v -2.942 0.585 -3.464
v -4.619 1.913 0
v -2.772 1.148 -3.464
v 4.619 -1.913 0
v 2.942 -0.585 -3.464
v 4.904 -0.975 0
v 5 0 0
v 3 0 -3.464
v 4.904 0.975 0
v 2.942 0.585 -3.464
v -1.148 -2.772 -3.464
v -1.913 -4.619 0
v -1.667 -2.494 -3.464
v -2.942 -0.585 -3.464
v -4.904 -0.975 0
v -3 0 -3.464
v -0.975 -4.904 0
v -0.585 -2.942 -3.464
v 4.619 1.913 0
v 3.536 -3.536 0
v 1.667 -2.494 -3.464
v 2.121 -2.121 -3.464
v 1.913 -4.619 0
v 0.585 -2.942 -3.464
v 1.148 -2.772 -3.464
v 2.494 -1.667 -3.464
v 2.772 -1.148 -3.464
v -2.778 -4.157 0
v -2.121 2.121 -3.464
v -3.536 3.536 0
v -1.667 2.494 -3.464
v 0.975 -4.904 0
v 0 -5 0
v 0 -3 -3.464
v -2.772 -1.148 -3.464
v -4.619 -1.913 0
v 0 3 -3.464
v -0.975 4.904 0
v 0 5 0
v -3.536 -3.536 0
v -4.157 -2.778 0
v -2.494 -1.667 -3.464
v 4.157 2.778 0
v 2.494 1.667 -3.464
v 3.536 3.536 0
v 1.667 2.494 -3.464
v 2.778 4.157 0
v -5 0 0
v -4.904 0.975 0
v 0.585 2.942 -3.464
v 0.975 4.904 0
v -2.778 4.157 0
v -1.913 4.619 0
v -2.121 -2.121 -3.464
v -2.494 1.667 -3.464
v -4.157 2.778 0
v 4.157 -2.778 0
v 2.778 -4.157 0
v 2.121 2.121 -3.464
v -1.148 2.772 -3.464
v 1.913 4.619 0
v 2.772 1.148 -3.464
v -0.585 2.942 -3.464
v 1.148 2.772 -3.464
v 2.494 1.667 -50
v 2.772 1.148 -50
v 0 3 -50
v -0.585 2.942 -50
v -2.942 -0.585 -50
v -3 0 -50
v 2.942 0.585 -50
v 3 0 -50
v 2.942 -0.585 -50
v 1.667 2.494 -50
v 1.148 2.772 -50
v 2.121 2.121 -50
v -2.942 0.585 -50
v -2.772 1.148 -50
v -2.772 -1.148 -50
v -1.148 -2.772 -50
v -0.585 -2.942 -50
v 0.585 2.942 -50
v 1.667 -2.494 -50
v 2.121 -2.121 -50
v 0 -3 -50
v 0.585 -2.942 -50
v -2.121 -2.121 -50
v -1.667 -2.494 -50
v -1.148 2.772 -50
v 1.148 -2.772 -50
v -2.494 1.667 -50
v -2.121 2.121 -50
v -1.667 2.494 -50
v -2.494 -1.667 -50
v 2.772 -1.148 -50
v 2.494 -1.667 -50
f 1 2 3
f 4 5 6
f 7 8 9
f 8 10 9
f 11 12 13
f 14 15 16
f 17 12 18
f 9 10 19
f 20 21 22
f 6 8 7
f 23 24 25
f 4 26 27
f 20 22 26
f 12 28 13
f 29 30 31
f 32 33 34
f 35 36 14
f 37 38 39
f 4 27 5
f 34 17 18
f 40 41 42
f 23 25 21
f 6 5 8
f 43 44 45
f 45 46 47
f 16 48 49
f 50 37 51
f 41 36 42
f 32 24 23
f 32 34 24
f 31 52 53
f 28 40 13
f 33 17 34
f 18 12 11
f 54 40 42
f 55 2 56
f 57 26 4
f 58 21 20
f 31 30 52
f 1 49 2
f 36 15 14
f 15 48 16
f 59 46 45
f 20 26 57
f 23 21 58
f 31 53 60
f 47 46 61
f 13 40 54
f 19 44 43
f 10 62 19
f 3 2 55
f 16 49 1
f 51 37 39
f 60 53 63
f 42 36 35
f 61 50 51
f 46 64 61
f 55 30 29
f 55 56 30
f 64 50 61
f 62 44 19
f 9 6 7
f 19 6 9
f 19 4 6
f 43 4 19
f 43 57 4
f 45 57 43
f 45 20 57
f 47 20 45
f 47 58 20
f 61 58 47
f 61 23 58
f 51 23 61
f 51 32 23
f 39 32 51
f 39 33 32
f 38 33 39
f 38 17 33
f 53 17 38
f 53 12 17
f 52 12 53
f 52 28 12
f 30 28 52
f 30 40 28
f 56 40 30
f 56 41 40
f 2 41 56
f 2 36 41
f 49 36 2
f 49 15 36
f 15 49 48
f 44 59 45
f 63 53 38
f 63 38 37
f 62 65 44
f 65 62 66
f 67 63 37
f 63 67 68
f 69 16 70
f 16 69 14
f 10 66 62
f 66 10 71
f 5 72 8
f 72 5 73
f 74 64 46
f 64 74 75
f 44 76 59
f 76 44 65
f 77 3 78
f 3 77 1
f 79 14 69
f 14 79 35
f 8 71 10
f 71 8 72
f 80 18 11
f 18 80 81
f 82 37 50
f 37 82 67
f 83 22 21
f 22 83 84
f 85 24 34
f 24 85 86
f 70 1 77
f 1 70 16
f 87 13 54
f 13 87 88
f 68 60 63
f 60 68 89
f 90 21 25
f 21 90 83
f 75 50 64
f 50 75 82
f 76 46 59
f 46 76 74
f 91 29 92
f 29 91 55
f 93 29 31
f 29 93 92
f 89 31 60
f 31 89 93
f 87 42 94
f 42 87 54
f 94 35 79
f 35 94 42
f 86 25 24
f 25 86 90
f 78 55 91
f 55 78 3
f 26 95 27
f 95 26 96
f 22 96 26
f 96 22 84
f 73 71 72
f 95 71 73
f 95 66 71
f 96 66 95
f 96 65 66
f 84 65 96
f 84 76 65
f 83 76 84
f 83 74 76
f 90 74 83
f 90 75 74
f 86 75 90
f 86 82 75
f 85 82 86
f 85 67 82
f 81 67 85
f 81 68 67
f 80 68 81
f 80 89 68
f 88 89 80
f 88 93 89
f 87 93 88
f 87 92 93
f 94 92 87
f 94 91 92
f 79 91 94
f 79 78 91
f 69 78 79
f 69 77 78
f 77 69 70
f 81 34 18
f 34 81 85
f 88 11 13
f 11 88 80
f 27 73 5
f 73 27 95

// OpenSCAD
// file: ../config.scad
// ============================================================
// PROJECT CONFIGURATION
// Description: Global settings for best_fence
// ============================================================

// ============================================================
// RENDERING SETTINGS
// ============================================================

// Preview quality (lower = faster preview)
PREVIEW_FN = 32;

// Export quality (higher = smoother STL)
EXPORT_FN = 128;

// Current mode (set to true when exporting STL)
// Override from command line: openscad -D 'EXPORT_MODE=true' ...
EXPORT_MODE = false;

// Convenience variable - automatically use correct quality
$fn = EXPORT_MODE ? EXPORT_FN : PREVIEW_FN;

// ============================================================
// PROJECT DIMENSIONS (mm and degrees)
// ============================================================

// best fence dimensions
// TODO: create a model of the best fence for reference
BEST_FENCE_INTERIOR_WIDTH = 152.5;
BEST_FENCE_INTERIOR_HEIGHT = 15;
BEST_FENCE_OVERALL_HEIGHT = 25;
BEST_FENCE_WALL_THICKNESS = 5.5;
BEST_FENCE_INDEXING_LIP_LENGTH = 5;
BEST_FENCE_INDEXING_LIP_HEIGHT = 8.5;

// mount dimensions
MOUNT_HEIGHT = 32;
// MOUNT_VERTICAL_CLEARANCE is the vertical clearance between the highest point of 
// the mount and the top of the Best Fence. 
// Negative values means it will be below the top of the Best Fence.
MOUNT_VERTICAL_CLEARANCE = -2; 
MOUNT_REAR_SUPPORT_WIDTH = 10;

// toe clamp dimensions
TOE_CLAMP_LENGTH = 28;
TOE_CLAMP_BOTTOM_WIDTH = 17.5;
TOE_CLAMP_ANGLE = 70; 
TOE_CLAMP_HEIGHT = 16;
TOE_CLAMP_INSERT_WIDTH = TOE_CLAMP_BOTTOM_WIDTH - 2; // should be slightly smaller than the bottom width of the clamp body to fit snugly
TOE_CLAMP_INSERT_LENGTH = TOE_CLAMP_LENGTH - 2; // should be slightly smaller than the length of the clamp body to fit snugly
TOE_CLAMP_INSERT_HEIGHT = 10;

// bolt dimensions
BOLT_HEAD_RADIUS = 6.5;
BOLT_HEAD_HEIGHT = 5;
BOLT_SHANK_RADIUS = 3.5;
BOLT_SHANK_HEIGHT = 16;

// spring dimensions
SPRING_RADIUS = 6.5;
SPRING_HEIGHT = 13;

// screw mount dimensions
SCREW_MOUNT_WIDTH = 32;
SCREW_MOUNT_LENGTH = 32;

// screw dimensions
SCREW_HEAD_RADIUS = 5;
SCREW_SHANK_RADIUS = 3;
SCREW_HEAD_ANGLE = 30; 
SCREW_HEIGHT = 50;

// helping hand dimensions
HELPING_HAND_HEAD_HEIGHT = 20;
HELPING_HAND_HEAD_RADIUS = 15.5;

// ============================================================
// TOLERANCES (mm and degrees)
// ============================================================

TOE_CLAMP_TOLERANCE_LENGTH = 1;
TOE_CLAMP_TOLERANCE_WIDTH = -3;

EPSILON = 1e-3;

// ============================================================
// RENDERING HELPERS
// ============================================================

// Helper function to determine if we're in preview mode
function is_preview() = !EXPORT_MODE;

// Helper function to determine if we're in export mode
function is_export() = EXPORT_MODE;
// main file
// File: screw.scad
// A simple screw for holding the Best Fence, used by the [attachment_screw](tools/attachment_screw.scad)
//   This module creates a simple screw with a tapered head and no threads.
// Includes:
//   use <hardware/screw.scad>;

include <../config.scad>;

// Module: screw
// Description: A simple screw for holding the Best Fence, used by the [attachment_screw](tools/attachment_screw.scad)
//   This module creates a simple screw with a tapered head and no threads.
// Example(3D,Render):
//   screw();
module screw() {
    screw_head_height = (SCREW_HEAD_RADIUS - SCREW_SHANK_RADIUS)/tan(SCREW_HEAD_ANGLE);
    screw_shank_height = SCREW_HEIGHT - screw_head_height;

    translate([0, 0, -SCREW_HEIGHT]) {
        translate([0, 0, screw_shank_height]) {
            // tapered head
            cylinder(h = screw_head_height, r1 = SCREW_SHANK_RADIUS, r2 = SCREW_HEAD_RADIUS, center = false);
        }
    
        // shank
        cylinder(h = screw_shank_height, r = SCREW_SHANK_RADIUS, center = false);
    }
}

screw();
